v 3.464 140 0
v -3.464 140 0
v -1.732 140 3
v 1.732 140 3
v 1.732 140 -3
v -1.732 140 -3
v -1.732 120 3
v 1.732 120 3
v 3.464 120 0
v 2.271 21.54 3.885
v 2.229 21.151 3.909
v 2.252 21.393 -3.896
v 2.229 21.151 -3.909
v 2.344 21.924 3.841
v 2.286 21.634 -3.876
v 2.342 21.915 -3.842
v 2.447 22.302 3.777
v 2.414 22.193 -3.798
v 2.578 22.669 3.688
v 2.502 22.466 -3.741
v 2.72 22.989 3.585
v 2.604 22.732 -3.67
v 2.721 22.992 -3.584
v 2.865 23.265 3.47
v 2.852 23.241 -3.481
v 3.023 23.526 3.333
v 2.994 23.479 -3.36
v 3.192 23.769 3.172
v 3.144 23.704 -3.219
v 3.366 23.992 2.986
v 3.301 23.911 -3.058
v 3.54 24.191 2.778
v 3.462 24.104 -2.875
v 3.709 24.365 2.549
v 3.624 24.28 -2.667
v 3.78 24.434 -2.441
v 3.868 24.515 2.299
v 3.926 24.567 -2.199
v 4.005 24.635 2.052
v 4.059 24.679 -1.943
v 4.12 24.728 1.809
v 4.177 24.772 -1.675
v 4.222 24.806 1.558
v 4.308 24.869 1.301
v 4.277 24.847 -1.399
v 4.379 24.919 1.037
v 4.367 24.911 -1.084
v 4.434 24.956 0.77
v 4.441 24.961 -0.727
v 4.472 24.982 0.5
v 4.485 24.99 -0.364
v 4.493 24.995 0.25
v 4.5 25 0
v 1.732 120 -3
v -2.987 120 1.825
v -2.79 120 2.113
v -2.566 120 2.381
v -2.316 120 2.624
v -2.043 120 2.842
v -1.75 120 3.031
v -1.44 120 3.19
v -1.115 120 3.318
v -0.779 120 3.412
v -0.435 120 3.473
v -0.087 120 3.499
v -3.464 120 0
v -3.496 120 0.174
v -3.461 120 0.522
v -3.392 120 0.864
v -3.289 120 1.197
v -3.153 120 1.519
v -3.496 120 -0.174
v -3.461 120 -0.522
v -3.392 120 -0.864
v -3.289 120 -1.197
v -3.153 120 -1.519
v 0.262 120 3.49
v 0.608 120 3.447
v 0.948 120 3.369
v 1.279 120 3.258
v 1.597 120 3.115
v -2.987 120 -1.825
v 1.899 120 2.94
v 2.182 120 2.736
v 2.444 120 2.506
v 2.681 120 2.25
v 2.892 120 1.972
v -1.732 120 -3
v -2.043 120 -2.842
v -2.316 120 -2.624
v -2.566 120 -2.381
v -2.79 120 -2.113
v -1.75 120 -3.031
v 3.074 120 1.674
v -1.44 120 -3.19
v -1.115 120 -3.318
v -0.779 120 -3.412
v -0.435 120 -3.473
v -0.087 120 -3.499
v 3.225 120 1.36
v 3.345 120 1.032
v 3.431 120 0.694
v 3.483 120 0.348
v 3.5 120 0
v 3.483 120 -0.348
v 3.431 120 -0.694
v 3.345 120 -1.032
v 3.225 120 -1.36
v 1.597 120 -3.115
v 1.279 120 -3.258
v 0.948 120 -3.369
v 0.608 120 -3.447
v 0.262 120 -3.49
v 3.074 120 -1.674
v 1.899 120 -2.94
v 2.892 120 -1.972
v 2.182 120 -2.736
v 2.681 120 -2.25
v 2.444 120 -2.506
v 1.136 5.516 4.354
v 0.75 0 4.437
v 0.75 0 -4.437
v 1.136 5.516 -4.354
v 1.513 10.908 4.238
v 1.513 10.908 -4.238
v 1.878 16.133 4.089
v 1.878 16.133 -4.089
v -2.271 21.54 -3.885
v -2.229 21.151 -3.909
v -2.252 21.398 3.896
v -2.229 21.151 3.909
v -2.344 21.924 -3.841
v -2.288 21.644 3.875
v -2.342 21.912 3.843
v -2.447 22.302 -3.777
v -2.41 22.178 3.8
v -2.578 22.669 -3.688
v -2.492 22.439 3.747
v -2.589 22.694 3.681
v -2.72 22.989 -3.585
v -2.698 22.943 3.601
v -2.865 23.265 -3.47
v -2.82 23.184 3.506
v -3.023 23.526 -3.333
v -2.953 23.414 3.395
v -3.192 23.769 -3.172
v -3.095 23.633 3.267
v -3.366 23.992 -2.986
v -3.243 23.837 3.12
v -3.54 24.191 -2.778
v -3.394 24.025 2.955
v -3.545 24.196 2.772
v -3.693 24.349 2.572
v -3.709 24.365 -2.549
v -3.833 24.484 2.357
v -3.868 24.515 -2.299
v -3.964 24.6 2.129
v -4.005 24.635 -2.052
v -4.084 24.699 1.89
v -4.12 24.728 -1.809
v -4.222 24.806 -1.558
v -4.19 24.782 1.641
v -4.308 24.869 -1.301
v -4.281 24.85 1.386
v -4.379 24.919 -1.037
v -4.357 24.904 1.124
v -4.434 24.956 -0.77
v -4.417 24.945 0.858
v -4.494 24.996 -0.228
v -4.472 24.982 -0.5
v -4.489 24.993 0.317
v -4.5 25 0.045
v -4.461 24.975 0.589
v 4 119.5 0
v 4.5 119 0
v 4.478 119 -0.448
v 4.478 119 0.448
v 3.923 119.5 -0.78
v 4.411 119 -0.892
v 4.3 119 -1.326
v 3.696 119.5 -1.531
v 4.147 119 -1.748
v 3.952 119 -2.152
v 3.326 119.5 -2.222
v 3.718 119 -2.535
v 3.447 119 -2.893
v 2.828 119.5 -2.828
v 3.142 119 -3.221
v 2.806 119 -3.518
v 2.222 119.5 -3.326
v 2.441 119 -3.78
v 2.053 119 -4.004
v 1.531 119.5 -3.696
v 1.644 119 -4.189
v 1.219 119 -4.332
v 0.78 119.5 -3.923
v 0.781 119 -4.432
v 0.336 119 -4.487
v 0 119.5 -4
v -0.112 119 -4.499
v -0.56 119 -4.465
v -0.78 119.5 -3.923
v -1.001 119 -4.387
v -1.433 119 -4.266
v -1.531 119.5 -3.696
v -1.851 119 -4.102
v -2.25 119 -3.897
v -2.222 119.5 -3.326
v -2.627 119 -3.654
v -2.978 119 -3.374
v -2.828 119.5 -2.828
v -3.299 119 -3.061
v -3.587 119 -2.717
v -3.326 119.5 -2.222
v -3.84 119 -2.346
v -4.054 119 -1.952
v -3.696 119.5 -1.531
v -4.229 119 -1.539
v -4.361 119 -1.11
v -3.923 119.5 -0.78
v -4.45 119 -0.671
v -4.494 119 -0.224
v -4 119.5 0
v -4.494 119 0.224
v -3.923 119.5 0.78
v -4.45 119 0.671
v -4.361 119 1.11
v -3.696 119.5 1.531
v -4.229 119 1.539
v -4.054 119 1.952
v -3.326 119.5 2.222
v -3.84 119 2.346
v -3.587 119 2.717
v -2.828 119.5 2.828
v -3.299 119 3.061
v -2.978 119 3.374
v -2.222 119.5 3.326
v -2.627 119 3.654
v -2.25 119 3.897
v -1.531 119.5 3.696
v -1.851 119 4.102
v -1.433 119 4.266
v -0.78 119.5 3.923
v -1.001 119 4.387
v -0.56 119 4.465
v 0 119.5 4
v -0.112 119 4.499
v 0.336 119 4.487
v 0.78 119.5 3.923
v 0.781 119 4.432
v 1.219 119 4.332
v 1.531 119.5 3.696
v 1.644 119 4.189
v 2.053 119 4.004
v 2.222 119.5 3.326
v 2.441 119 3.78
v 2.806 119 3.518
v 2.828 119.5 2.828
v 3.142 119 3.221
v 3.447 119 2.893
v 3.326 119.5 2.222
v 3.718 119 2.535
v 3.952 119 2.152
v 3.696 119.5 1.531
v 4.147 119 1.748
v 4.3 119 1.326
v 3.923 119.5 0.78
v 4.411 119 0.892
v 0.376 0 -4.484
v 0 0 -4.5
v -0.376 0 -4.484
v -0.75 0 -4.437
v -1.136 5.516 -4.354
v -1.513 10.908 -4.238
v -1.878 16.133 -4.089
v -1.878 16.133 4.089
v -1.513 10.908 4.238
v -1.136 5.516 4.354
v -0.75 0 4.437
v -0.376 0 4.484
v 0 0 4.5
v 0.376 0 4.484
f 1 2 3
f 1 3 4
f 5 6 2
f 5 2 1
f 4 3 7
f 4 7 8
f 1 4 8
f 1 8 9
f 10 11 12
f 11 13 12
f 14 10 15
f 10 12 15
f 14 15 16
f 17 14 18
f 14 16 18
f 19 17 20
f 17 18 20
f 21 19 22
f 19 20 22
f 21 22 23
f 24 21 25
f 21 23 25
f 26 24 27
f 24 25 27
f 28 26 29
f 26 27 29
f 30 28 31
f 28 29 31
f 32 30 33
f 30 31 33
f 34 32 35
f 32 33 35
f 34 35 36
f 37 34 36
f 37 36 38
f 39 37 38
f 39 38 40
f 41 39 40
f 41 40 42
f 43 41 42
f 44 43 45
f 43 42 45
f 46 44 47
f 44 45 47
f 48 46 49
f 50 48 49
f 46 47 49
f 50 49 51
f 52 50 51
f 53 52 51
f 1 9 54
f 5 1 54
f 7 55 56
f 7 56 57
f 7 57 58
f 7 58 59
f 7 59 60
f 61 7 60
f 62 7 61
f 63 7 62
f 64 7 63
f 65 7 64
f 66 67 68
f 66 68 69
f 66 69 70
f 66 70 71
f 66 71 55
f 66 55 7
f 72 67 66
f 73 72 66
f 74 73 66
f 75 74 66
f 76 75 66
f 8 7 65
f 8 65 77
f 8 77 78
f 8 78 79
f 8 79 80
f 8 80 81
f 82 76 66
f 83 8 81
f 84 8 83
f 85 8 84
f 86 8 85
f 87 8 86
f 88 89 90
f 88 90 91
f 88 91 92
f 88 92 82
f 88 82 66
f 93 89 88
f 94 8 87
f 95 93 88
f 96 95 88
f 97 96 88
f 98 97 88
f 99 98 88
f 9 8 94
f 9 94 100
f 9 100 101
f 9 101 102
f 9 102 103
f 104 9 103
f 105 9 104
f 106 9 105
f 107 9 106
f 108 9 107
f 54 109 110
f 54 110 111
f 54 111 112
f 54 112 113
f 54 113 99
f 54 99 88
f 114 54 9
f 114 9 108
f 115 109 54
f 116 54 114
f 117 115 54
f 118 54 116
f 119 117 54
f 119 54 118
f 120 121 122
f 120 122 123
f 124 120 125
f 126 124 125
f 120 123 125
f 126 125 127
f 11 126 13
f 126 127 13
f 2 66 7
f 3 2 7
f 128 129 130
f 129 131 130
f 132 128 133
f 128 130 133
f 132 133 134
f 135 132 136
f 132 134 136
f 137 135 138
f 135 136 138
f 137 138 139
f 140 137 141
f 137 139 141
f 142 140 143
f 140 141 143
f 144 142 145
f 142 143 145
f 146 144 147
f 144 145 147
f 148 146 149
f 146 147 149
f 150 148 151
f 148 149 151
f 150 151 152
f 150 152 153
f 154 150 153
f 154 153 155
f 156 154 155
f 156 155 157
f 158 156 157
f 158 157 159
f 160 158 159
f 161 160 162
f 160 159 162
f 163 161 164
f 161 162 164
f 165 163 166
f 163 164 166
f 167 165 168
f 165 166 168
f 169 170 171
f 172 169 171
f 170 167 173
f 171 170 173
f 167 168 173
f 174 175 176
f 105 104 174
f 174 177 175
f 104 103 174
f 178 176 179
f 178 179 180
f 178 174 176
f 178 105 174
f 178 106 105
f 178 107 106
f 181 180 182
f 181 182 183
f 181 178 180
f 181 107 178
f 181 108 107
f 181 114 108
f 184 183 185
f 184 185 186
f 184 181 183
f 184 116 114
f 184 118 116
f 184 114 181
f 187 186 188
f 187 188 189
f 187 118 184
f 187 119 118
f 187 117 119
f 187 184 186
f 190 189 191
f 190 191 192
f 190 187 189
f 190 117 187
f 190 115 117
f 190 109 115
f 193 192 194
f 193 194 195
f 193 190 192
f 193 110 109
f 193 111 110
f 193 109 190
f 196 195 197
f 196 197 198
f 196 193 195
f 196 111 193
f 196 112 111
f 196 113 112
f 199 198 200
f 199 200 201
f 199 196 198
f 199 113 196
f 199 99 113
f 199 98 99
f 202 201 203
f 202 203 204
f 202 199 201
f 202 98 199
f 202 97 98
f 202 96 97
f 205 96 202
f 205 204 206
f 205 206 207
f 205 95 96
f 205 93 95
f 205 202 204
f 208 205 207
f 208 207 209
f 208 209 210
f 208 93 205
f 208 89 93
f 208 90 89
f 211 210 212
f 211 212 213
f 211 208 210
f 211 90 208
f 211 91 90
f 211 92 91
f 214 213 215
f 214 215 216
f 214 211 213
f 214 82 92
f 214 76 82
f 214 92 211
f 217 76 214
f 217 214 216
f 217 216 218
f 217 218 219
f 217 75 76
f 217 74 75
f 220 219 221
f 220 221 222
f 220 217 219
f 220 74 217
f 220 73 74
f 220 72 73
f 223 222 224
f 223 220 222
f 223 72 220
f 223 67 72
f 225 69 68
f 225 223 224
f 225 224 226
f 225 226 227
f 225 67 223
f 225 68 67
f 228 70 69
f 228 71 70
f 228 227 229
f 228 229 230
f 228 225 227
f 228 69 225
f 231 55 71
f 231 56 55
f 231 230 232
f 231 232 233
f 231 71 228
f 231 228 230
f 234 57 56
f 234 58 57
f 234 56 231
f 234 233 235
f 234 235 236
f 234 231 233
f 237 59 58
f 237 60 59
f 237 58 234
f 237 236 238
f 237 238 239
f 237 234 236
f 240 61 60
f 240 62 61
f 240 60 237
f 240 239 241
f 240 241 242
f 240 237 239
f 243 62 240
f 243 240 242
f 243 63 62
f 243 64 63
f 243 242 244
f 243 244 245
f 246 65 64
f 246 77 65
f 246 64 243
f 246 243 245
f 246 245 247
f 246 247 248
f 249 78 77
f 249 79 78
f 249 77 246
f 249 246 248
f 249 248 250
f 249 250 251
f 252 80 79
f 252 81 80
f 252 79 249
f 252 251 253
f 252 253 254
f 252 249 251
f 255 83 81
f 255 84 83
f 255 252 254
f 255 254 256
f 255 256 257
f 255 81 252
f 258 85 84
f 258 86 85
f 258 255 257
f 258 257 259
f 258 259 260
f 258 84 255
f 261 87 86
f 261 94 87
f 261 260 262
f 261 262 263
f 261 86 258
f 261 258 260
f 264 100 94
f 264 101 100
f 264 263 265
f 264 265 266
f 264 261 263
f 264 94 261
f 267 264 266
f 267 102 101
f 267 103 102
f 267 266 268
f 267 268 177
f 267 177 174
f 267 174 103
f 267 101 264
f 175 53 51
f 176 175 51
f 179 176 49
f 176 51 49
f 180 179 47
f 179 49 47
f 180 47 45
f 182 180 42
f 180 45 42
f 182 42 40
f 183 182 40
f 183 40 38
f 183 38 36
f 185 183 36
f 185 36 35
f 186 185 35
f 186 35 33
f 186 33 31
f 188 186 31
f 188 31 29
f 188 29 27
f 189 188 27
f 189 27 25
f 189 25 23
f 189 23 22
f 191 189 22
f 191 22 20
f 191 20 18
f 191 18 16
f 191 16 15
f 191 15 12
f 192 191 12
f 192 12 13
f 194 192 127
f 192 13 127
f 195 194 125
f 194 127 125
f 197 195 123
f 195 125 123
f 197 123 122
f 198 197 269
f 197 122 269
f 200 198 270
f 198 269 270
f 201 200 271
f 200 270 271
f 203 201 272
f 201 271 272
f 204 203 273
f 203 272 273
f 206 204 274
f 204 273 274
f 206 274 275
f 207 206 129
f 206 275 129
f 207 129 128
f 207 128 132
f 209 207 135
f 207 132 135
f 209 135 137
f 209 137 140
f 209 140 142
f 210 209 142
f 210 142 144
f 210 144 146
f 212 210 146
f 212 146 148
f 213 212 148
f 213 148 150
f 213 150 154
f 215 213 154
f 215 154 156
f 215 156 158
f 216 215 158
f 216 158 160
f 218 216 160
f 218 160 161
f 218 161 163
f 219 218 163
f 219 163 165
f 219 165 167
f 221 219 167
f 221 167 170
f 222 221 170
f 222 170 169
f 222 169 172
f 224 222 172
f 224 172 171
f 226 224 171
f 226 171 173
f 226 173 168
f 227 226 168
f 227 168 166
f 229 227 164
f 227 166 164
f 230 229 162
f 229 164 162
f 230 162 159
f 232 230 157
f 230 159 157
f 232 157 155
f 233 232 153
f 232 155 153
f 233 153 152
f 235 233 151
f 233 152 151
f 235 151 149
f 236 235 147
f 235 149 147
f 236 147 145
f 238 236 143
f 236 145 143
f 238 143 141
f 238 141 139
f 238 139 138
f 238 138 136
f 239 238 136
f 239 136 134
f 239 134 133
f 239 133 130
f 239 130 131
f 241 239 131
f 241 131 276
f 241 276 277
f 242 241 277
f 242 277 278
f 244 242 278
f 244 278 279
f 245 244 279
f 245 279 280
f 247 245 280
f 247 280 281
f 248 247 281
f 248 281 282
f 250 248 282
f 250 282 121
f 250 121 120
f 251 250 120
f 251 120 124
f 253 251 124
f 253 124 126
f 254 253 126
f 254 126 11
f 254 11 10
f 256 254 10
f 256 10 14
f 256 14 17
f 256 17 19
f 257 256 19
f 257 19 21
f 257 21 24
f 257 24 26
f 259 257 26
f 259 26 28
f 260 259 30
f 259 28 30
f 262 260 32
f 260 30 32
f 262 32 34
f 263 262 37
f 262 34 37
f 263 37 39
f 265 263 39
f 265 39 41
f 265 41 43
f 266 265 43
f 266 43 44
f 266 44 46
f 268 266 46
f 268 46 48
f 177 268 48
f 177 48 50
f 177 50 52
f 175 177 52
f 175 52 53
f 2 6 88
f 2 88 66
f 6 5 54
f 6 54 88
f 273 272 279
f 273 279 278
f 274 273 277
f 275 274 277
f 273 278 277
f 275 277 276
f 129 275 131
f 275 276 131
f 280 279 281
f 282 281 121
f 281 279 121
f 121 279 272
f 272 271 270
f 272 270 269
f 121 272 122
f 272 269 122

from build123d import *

# Parameters (mm, degrees)
SKETCH1_R               = 4.5
BOSS_EXTRUDE1_DEPTH     = 120
BOSS_EXTRUDE2_DEPTH     = 20
CHAMFER1_SIZE           = 1
CUT_EXTRUDE1_DEPTH      = 5.5
CUT_EXTRUDE1_DEPTH_BACK = 5.5


with BuildPart() as part:
    # Sketch1 → Boss-Extrude1 (new body)
    with BuildSketch(Plane(origin=(0, 0, 0), x_dir=(1, 0, 0), z_dir=(0, 1, 0))):
        Circle(SKETCH1_R)
    extrude(amount=BOSS_EXTRUDE1_DEPTH)

    # Sketch2 → Boss-Extrude2 (add)
    with BuildSketch(Plane(origin=(0, 120, 0), x_dir=(1, 0, 0), z_dir=(0, 1, 0))):
        Polygon((1.732050808, 3), (-1.732050808, 3), (-3.464101615, 0), (-1.732050808, -3), (1.732050808, -3), (3.464101615, 0), align=None)
    extrude(amount=BOSS_EXTRUDE2_DEPTH)

    # Chamfer1
    chamfer1_edges = [part.edges().sort_by_distance(p)[0] for p in [
        (-4.5, 120, 0),
    ]]
    chamfer(chamfer1_edges, length=CHAMFER1_SIZE)

    # Sketch3 → Cut-Extrude1 (cut, two sides)
    with BuildSketch(Plane.XY) as cut_extrude1_sk:
        with BuildLine():
            Line((0.75, 0), (2.229044758, 21.151325457))
            ThreePointArc((2.229044758, 21.151325457), (2.910634909, 23.343484317), (4.5, 25))
            Line((4.5, 25), (4.5, 0))
            Line((4.5, 0), (0.75, 0))
        make_face()
        with BuildLine():
            Line((-4.5, 25), (-4.5, 0))
            Line((-4.5, 0), (-0.75, 0))
            Line((-0.75, 0), (-2.229044758, 21.151325457))
            ThreePointArc((-2.229044758, 21.151325457), (-2.910634909, 23.343484317), (-4.5, 25))
        make_face()
    extrude(amount=CUT_EXTRUDE1_DEPTH, mode=Mode.SUBTRACT)
    extrude(cut_extrude1_sk.sketch, amount=-CUT_EXTRUDE1_DEPTH_BACK, mode=Mode.SUBTRACT)


solid = part.part
